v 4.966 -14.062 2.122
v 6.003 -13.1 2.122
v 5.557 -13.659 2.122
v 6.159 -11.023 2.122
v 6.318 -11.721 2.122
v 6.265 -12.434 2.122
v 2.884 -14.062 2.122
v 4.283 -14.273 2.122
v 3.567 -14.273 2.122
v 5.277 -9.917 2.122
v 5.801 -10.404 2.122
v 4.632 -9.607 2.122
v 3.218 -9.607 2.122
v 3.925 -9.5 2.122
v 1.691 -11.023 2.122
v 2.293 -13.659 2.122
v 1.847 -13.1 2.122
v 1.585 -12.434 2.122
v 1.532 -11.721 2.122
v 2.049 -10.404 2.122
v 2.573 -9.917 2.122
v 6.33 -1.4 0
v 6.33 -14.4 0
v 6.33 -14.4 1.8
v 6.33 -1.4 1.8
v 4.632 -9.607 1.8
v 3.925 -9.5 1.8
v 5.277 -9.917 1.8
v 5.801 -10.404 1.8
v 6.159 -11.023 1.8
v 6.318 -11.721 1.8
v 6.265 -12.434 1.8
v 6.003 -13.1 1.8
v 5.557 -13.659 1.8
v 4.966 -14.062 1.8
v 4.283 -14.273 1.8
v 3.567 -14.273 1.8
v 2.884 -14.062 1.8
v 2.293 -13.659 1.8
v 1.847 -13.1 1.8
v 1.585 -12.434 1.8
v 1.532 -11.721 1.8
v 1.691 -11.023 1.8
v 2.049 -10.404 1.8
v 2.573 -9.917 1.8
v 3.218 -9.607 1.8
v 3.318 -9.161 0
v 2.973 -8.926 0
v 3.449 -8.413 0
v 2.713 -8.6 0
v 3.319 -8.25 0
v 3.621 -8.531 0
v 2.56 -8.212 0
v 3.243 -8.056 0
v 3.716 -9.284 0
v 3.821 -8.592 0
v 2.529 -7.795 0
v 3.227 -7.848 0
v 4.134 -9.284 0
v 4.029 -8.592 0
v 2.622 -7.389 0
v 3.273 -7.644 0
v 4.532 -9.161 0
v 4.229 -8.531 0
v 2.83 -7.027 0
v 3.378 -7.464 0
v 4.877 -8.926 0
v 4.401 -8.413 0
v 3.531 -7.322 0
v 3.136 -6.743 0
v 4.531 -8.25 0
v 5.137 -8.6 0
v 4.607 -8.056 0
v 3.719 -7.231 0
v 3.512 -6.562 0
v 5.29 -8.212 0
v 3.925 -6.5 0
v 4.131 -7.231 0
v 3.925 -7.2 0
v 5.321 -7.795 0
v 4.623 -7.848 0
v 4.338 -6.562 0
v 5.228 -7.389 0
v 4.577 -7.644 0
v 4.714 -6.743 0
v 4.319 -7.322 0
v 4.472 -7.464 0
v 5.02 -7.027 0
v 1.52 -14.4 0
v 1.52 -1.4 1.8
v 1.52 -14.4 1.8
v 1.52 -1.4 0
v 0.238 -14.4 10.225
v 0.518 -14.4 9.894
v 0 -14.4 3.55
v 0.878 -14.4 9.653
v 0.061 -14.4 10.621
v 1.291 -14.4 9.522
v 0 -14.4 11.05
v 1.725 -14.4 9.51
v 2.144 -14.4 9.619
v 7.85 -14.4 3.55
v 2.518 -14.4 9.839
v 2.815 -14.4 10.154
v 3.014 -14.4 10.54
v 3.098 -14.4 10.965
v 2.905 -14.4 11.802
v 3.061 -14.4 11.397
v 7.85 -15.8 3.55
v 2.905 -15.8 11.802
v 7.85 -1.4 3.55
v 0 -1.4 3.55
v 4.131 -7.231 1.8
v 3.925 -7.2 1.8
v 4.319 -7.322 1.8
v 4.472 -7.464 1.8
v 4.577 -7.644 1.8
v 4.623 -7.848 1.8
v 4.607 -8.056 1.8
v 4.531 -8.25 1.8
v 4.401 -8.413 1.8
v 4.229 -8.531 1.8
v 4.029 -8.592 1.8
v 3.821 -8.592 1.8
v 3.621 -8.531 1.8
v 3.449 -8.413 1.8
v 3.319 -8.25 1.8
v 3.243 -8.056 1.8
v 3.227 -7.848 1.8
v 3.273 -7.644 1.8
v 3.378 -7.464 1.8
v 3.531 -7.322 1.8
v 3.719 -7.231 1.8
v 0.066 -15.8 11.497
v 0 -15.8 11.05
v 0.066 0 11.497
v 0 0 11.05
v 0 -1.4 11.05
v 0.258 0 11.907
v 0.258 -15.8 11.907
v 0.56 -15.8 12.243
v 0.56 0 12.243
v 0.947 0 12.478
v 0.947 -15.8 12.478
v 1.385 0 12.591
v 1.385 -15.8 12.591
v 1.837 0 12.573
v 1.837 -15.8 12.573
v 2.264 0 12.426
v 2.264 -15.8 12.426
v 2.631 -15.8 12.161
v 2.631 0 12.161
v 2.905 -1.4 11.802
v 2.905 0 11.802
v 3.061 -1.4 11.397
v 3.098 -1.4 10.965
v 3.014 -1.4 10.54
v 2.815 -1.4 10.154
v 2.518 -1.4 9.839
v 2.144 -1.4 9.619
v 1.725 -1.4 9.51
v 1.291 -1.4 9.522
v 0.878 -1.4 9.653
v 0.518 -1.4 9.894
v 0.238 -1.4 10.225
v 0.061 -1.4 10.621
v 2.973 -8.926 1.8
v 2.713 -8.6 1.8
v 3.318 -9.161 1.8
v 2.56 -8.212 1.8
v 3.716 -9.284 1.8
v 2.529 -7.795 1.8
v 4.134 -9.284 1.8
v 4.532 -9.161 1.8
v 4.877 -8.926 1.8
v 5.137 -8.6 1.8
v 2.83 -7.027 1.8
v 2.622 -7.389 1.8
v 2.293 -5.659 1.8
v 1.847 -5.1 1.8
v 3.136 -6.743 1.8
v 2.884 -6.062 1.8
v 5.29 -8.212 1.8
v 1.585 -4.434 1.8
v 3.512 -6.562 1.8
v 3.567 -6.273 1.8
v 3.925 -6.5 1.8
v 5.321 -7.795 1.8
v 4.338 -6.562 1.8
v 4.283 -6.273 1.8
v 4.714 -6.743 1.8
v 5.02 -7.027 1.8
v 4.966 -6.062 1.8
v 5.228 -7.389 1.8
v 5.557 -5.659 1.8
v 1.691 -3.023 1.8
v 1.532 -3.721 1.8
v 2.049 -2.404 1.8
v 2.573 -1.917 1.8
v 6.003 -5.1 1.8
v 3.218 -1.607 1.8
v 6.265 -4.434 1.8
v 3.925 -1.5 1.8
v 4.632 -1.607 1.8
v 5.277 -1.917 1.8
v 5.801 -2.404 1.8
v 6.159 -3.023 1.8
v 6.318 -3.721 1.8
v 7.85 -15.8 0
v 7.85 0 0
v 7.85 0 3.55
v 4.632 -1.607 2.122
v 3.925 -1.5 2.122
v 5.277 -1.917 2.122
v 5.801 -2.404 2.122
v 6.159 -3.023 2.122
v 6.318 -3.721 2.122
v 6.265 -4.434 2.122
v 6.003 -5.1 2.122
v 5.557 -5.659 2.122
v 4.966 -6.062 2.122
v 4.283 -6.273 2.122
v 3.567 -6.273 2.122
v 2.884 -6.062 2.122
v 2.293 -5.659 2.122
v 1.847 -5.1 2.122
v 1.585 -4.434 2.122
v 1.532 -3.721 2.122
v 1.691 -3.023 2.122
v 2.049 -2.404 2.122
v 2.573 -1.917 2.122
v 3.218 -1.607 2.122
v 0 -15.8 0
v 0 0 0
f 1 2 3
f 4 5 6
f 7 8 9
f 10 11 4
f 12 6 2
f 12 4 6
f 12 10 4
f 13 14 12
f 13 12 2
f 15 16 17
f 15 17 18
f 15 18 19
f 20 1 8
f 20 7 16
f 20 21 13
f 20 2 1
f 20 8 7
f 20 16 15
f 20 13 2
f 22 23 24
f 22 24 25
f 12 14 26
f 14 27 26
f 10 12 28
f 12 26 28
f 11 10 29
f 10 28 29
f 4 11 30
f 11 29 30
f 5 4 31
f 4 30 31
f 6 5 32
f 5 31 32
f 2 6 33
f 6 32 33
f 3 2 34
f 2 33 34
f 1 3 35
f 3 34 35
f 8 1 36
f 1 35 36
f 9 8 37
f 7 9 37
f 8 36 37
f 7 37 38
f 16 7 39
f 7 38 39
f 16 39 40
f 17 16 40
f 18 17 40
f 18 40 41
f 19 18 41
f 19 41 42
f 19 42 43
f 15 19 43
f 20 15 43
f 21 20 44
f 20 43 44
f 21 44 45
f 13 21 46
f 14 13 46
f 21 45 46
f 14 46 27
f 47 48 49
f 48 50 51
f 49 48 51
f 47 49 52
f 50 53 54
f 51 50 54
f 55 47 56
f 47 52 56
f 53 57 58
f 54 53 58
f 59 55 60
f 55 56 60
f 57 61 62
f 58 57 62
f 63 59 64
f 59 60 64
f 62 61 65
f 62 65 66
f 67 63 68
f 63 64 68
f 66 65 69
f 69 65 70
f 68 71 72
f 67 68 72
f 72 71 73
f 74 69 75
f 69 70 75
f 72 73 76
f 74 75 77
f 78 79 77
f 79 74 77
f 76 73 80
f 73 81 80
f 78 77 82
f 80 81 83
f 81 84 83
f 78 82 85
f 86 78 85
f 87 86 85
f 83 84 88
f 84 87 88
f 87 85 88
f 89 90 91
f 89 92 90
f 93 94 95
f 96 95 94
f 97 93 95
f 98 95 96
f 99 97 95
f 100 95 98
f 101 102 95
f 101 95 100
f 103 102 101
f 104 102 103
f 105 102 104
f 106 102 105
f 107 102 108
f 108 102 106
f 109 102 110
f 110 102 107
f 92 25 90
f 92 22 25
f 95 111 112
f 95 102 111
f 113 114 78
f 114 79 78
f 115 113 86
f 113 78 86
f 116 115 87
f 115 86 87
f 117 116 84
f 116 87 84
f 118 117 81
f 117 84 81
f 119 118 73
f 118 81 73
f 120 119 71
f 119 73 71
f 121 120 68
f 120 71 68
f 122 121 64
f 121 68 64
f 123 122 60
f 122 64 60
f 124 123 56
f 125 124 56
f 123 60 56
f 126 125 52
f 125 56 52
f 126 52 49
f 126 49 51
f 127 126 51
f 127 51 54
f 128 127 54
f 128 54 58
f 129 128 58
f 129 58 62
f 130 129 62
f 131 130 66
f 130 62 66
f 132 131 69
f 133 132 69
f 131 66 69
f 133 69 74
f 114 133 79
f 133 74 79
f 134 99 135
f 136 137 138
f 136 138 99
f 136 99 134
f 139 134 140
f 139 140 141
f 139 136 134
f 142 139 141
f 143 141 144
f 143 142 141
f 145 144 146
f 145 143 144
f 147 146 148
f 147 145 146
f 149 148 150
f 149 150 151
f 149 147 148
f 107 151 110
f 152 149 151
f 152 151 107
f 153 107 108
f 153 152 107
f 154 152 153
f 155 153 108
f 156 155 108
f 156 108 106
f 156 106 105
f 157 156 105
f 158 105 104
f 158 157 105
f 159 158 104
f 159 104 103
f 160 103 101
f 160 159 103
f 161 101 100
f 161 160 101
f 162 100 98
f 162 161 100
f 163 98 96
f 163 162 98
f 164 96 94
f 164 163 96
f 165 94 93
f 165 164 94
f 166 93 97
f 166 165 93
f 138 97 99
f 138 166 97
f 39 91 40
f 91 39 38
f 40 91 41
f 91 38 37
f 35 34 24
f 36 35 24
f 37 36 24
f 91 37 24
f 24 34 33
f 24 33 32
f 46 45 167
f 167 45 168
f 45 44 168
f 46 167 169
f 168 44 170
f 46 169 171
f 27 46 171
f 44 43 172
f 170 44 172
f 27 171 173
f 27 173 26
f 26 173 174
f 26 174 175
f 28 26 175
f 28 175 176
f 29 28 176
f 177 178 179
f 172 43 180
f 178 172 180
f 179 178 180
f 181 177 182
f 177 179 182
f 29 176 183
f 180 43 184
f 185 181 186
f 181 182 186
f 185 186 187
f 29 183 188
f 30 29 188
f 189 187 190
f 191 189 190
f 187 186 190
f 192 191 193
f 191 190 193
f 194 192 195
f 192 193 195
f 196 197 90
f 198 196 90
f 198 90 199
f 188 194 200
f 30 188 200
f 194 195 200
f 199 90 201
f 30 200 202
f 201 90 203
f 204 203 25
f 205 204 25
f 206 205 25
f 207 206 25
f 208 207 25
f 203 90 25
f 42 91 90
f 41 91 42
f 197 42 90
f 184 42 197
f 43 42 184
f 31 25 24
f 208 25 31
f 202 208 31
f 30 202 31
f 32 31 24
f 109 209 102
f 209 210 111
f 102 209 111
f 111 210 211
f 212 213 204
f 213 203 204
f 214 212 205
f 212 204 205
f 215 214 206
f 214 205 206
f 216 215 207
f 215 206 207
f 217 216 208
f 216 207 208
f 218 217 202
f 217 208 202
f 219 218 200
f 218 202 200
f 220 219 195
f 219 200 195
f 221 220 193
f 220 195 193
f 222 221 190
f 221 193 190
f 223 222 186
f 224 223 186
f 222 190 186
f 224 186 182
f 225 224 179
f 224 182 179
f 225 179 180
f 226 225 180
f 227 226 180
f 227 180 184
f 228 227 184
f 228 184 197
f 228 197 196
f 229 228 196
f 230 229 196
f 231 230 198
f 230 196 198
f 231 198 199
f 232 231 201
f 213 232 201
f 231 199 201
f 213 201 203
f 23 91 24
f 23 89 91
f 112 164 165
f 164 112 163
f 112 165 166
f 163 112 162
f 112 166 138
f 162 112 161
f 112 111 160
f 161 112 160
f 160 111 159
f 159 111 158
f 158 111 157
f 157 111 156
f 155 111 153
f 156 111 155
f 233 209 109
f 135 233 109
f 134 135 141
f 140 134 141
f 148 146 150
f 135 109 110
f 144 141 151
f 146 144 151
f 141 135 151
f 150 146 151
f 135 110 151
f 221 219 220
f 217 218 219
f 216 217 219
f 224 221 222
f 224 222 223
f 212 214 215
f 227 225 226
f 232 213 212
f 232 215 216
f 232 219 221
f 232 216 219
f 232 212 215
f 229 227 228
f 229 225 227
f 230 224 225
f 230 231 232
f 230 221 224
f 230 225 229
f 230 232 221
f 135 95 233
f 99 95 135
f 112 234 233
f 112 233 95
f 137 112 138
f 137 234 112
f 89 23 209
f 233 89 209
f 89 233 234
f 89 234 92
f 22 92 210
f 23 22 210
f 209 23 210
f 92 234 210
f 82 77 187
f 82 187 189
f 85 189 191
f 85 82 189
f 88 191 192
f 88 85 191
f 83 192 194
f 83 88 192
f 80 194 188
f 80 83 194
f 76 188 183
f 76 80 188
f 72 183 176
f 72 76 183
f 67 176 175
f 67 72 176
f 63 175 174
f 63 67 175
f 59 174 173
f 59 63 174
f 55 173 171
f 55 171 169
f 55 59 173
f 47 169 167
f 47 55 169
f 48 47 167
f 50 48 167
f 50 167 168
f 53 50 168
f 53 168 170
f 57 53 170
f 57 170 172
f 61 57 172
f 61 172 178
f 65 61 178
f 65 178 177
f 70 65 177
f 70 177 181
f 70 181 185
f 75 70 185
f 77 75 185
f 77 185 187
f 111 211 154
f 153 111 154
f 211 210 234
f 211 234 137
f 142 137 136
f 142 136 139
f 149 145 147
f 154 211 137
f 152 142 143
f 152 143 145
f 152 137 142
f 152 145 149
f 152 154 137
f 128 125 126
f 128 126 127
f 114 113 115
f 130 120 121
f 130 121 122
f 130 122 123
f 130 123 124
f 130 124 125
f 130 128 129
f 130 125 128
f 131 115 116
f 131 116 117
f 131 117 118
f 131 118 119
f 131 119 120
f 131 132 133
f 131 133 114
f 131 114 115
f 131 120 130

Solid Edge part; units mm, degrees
sketch "Sketch1" plane through (0, 0, 0) normal (0, -1, 0) x (1, 0, 0)
  line L0 (0, 0) -> (0, 11.05)
  line L1 (7.85, 3.55) -> (2.9054, 11.802)
  line L2 (7.85, 0) -> (7.85, 3.55)
  line L3 (0, 0) -> (7.85, 0)
  arc A0 (0, 11.05) -> (2.9054, 11.802) centre (1.55, 11.05) cw
extrude "Protrusion1" add sketch "Sketch1" along normal blind 15.8
sketch "Sketch2" plane through (3.925, -14.4, 6.3) normal (0, -1, 0) x (1, 0, 0)
  line L0 (-3.925, -2.75) -> (-3.925, 4.75)
  line L1 (3.925, -2.75) -> (-3.925, -2.75)
  line L2 (-1.0196, 5.502) -> (3.925, -2.75)
  arc A0 (-1.0196, 5.502) -> (-3.925, 4.75) centre (-2.375, 4.75) cw
extrude "ExtrudedCutout_1" cut sketch "Sketch2" against normal blind 13
sketch "Sketch3" plane through (3.925, -7.9, 0) normal (0, 0, -1) x (0, 1, 0)
  line L0 (6.5, -2.405) -> (-6.5, -2.405)
  line L1 (-6.5, -2.405) -> (-6.5, 2.405)
  line L2 (-6.5, 2.405) -> (6.5, 2.405)
  line L3 (6.5, 2.405) -> (6.5, -2.405)
  circle A0 centre (0, 0) radius 1.4
  circle A1 centre (0, 0) radius 0.7
  dimension "D1" = 2.8
  dimension "D2" = 1.4
extrude "ExtrudedCutout_2" cut sketch "Sketch3" against normal blind 1.8
sketch "Sketch4" plane through (3.925, -7.9, 0) normal (0, 0, -1) x (0, 1, 0)
  circle A0 centre (-4, 0) radius 2.4
  circle A1 centre (4, 0) radius 2.4
  dimension "D1" = 4.8
  dimension "D2" = 4.8
extrude "ExtrudedCutout_3" cut sketch "Sketch4" against normal blind 2.1224
